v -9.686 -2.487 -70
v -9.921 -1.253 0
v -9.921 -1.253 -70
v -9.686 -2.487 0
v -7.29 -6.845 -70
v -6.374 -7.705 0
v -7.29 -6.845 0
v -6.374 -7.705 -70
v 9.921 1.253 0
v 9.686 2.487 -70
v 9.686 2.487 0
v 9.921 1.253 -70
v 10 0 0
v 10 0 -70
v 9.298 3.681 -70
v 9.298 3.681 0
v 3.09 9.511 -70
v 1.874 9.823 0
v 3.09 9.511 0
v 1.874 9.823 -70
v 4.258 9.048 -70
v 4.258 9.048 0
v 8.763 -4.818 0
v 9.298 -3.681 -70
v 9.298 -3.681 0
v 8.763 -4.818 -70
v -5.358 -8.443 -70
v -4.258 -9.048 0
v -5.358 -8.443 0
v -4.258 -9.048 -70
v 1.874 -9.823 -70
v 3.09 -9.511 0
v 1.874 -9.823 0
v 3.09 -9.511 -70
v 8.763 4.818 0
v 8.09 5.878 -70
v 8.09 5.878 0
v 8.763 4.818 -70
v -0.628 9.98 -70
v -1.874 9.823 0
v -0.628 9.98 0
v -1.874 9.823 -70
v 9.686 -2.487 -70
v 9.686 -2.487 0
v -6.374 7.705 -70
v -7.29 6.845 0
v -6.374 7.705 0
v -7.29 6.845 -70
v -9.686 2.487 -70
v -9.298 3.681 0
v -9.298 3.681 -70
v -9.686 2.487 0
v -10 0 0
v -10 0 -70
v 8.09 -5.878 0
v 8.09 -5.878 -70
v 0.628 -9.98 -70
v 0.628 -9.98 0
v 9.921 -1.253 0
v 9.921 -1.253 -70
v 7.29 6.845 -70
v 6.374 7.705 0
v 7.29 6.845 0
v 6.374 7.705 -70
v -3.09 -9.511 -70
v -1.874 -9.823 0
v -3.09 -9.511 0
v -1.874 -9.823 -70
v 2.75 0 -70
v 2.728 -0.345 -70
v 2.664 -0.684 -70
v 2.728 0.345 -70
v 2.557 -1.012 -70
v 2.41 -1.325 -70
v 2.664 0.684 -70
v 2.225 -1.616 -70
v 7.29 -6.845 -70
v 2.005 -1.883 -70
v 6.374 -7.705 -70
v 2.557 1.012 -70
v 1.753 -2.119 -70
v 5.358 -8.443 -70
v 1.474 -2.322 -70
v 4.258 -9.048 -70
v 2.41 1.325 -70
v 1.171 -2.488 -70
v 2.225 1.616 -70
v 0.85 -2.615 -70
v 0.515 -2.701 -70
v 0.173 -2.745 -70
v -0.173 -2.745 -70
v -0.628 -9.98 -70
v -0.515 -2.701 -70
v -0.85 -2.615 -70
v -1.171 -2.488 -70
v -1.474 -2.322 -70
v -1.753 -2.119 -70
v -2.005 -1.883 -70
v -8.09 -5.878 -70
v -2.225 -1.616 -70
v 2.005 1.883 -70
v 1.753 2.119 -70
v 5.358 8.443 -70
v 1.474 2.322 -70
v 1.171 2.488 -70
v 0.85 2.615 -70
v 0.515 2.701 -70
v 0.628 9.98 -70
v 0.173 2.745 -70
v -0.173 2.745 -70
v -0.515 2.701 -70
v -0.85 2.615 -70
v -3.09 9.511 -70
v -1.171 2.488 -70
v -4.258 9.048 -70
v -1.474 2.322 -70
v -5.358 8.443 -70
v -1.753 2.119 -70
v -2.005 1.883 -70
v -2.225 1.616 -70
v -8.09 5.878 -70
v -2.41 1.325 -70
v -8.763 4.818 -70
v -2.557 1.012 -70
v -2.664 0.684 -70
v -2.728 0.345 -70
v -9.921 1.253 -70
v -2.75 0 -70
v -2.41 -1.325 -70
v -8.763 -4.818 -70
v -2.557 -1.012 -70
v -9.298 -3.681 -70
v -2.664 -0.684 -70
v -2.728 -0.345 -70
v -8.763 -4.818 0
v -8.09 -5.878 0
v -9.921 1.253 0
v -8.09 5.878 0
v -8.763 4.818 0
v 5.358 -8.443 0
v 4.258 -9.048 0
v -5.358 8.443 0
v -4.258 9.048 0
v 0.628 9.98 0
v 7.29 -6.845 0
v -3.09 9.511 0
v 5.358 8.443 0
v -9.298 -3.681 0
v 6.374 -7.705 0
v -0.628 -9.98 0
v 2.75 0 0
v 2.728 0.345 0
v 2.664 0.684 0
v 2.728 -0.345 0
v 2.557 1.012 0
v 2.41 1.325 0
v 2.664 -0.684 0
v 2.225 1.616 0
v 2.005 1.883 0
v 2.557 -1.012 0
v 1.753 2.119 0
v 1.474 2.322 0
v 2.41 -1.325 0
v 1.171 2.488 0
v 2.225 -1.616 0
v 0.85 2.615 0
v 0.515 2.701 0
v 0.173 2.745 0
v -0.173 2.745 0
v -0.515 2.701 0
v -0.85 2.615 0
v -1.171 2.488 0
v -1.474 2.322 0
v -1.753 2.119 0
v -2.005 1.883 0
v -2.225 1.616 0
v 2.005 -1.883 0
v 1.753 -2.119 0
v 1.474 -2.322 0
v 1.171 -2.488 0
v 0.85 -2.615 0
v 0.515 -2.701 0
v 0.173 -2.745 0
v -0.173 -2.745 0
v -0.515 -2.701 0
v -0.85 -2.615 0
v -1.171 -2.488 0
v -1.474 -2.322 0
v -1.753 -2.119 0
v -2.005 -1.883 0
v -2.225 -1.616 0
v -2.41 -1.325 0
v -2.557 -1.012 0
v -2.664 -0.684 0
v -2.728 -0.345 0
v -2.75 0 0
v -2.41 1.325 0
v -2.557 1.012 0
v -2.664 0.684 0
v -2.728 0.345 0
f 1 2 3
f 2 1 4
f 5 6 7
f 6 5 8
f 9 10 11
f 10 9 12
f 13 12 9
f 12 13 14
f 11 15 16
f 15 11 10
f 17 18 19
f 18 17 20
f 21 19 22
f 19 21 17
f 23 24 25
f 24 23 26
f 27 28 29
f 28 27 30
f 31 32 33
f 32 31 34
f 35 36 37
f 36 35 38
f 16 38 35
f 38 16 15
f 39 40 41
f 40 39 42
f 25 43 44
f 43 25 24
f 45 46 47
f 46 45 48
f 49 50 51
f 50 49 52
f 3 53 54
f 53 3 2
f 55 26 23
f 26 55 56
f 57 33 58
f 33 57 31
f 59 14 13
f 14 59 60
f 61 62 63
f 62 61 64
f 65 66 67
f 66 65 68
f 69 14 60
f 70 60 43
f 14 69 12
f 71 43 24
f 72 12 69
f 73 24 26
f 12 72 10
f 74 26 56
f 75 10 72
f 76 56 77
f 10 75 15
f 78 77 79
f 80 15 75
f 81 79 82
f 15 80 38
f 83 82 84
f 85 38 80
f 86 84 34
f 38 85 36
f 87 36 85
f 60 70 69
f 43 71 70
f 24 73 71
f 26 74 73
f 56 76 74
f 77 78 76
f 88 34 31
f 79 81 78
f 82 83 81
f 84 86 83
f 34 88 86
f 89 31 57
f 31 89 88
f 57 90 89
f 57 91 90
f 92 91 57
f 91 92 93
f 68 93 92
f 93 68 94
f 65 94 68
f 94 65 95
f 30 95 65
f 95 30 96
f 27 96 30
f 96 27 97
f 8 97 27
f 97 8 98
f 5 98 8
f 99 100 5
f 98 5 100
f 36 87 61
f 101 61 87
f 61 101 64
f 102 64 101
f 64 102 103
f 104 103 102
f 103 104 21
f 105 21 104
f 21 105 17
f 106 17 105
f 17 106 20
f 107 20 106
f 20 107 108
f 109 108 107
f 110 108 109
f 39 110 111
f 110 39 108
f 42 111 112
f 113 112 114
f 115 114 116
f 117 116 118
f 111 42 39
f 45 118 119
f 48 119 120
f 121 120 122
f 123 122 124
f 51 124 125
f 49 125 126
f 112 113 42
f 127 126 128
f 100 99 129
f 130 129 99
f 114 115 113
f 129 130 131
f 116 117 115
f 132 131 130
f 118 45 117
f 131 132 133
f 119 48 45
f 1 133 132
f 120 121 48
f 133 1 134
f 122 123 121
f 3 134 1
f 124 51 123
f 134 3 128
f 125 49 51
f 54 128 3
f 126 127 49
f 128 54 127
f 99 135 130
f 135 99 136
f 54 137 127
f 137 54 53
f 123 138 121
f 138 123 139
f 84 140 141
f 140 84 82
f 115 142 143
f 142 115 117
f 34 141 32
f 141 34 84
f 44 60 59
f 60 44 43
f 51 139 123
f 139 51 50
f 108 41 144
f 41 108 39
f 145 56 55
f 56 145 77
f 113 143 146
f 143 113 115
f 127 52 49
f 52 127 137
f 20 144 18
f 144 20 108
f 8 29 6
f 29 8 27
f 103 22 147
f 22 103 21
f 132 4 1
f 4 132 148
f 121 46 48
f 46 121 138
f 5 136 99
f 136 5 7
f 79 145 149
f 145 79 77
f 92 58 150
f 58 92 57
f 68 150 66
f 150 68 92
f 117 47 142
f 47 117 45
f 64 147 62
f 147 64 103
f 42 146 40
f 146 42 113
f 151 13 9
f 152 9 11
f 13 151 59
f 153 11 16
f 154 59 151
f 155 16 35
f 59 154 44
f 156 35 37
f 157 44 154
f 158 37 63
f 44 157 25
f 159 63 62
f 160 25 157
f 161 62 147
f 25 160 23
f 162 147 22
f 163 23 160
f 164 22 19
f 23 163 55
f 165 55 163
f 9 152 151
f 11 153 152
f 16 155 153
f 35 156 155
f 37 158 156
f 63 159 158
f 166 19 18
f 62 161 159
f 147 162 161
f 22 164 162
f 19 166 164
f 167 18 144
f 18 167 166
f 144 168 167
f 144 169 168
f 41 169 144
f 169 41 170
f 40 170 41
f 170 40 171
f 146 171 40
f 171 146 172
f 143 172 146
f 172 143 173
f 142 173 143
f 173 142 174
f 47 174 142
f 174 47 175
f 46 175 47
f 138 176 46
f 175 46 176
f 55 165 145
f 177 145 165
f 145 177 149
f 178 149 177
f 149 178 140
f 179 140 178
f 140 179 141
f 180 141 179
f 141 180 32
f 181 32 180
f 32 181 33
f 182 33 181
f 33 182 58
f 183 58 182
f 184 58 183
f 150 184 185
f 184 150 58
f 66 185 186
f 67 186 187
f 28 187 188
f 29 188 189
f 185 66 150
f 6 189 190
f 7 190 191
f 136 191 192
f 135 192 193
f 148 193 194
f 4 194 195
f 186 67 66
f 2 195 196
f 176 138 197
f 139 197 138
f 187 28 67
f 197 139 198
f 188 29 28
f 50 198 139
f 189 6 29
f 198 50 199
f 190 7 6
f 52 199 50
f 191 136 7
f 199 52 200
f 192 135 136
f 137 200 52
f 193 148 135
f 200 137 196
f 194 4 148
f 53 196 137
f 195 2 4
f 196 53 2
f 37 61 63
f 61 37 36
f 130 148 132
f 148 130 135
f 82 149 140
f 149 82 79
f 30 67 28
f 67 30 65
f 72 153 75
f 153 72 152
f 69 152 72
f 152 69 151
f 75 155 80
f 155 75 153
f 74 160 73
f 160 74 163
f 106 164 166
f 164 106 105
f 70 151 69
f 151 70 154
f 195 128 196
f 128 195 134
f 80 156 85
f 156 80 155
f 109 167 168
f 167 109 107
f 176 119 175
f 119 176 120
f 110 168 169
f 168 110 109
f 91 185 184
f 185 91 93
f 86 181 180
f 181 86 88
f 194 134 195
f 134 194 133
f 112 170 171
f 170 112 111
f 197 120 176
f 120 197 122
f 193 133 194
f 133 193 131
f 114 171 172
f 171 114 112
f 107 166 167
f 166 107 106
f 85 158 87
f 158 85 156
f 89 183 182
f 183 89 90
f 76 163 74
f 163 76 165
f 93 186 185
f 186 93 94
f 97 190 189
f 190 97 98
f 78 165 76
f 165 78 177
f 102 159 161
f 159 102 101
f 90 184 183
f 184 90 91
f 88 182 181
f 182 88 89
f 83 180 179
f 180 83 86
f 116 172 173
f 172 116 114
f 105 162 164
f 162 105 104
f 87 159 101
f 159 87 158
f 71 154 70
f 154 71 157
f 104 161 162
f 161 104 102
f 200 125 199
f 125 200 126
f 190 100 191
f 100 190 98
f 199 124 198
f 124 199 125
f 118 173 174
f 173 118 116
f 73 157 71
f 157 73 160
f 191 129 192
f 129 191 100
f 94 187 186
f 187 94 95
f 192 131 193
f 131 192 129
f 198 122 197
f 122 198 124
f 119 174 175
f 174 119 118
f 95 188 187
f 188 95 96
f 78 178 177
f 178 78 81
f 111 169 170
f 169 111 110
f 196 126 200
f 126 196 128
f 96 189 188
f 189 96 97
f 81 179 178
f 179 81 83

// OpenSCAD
$fn = 50;


difference() {
	union() {
		translate(v = [0, 0, -70.0000000000]) {
			cylinder(h = 70, r = 10.0000000000);
		}
	}
	union() {
		#translate(v = [0, 0, -70]) {
			cylinder(h = 70, r = 2.7500000000);
		}
	}
}
